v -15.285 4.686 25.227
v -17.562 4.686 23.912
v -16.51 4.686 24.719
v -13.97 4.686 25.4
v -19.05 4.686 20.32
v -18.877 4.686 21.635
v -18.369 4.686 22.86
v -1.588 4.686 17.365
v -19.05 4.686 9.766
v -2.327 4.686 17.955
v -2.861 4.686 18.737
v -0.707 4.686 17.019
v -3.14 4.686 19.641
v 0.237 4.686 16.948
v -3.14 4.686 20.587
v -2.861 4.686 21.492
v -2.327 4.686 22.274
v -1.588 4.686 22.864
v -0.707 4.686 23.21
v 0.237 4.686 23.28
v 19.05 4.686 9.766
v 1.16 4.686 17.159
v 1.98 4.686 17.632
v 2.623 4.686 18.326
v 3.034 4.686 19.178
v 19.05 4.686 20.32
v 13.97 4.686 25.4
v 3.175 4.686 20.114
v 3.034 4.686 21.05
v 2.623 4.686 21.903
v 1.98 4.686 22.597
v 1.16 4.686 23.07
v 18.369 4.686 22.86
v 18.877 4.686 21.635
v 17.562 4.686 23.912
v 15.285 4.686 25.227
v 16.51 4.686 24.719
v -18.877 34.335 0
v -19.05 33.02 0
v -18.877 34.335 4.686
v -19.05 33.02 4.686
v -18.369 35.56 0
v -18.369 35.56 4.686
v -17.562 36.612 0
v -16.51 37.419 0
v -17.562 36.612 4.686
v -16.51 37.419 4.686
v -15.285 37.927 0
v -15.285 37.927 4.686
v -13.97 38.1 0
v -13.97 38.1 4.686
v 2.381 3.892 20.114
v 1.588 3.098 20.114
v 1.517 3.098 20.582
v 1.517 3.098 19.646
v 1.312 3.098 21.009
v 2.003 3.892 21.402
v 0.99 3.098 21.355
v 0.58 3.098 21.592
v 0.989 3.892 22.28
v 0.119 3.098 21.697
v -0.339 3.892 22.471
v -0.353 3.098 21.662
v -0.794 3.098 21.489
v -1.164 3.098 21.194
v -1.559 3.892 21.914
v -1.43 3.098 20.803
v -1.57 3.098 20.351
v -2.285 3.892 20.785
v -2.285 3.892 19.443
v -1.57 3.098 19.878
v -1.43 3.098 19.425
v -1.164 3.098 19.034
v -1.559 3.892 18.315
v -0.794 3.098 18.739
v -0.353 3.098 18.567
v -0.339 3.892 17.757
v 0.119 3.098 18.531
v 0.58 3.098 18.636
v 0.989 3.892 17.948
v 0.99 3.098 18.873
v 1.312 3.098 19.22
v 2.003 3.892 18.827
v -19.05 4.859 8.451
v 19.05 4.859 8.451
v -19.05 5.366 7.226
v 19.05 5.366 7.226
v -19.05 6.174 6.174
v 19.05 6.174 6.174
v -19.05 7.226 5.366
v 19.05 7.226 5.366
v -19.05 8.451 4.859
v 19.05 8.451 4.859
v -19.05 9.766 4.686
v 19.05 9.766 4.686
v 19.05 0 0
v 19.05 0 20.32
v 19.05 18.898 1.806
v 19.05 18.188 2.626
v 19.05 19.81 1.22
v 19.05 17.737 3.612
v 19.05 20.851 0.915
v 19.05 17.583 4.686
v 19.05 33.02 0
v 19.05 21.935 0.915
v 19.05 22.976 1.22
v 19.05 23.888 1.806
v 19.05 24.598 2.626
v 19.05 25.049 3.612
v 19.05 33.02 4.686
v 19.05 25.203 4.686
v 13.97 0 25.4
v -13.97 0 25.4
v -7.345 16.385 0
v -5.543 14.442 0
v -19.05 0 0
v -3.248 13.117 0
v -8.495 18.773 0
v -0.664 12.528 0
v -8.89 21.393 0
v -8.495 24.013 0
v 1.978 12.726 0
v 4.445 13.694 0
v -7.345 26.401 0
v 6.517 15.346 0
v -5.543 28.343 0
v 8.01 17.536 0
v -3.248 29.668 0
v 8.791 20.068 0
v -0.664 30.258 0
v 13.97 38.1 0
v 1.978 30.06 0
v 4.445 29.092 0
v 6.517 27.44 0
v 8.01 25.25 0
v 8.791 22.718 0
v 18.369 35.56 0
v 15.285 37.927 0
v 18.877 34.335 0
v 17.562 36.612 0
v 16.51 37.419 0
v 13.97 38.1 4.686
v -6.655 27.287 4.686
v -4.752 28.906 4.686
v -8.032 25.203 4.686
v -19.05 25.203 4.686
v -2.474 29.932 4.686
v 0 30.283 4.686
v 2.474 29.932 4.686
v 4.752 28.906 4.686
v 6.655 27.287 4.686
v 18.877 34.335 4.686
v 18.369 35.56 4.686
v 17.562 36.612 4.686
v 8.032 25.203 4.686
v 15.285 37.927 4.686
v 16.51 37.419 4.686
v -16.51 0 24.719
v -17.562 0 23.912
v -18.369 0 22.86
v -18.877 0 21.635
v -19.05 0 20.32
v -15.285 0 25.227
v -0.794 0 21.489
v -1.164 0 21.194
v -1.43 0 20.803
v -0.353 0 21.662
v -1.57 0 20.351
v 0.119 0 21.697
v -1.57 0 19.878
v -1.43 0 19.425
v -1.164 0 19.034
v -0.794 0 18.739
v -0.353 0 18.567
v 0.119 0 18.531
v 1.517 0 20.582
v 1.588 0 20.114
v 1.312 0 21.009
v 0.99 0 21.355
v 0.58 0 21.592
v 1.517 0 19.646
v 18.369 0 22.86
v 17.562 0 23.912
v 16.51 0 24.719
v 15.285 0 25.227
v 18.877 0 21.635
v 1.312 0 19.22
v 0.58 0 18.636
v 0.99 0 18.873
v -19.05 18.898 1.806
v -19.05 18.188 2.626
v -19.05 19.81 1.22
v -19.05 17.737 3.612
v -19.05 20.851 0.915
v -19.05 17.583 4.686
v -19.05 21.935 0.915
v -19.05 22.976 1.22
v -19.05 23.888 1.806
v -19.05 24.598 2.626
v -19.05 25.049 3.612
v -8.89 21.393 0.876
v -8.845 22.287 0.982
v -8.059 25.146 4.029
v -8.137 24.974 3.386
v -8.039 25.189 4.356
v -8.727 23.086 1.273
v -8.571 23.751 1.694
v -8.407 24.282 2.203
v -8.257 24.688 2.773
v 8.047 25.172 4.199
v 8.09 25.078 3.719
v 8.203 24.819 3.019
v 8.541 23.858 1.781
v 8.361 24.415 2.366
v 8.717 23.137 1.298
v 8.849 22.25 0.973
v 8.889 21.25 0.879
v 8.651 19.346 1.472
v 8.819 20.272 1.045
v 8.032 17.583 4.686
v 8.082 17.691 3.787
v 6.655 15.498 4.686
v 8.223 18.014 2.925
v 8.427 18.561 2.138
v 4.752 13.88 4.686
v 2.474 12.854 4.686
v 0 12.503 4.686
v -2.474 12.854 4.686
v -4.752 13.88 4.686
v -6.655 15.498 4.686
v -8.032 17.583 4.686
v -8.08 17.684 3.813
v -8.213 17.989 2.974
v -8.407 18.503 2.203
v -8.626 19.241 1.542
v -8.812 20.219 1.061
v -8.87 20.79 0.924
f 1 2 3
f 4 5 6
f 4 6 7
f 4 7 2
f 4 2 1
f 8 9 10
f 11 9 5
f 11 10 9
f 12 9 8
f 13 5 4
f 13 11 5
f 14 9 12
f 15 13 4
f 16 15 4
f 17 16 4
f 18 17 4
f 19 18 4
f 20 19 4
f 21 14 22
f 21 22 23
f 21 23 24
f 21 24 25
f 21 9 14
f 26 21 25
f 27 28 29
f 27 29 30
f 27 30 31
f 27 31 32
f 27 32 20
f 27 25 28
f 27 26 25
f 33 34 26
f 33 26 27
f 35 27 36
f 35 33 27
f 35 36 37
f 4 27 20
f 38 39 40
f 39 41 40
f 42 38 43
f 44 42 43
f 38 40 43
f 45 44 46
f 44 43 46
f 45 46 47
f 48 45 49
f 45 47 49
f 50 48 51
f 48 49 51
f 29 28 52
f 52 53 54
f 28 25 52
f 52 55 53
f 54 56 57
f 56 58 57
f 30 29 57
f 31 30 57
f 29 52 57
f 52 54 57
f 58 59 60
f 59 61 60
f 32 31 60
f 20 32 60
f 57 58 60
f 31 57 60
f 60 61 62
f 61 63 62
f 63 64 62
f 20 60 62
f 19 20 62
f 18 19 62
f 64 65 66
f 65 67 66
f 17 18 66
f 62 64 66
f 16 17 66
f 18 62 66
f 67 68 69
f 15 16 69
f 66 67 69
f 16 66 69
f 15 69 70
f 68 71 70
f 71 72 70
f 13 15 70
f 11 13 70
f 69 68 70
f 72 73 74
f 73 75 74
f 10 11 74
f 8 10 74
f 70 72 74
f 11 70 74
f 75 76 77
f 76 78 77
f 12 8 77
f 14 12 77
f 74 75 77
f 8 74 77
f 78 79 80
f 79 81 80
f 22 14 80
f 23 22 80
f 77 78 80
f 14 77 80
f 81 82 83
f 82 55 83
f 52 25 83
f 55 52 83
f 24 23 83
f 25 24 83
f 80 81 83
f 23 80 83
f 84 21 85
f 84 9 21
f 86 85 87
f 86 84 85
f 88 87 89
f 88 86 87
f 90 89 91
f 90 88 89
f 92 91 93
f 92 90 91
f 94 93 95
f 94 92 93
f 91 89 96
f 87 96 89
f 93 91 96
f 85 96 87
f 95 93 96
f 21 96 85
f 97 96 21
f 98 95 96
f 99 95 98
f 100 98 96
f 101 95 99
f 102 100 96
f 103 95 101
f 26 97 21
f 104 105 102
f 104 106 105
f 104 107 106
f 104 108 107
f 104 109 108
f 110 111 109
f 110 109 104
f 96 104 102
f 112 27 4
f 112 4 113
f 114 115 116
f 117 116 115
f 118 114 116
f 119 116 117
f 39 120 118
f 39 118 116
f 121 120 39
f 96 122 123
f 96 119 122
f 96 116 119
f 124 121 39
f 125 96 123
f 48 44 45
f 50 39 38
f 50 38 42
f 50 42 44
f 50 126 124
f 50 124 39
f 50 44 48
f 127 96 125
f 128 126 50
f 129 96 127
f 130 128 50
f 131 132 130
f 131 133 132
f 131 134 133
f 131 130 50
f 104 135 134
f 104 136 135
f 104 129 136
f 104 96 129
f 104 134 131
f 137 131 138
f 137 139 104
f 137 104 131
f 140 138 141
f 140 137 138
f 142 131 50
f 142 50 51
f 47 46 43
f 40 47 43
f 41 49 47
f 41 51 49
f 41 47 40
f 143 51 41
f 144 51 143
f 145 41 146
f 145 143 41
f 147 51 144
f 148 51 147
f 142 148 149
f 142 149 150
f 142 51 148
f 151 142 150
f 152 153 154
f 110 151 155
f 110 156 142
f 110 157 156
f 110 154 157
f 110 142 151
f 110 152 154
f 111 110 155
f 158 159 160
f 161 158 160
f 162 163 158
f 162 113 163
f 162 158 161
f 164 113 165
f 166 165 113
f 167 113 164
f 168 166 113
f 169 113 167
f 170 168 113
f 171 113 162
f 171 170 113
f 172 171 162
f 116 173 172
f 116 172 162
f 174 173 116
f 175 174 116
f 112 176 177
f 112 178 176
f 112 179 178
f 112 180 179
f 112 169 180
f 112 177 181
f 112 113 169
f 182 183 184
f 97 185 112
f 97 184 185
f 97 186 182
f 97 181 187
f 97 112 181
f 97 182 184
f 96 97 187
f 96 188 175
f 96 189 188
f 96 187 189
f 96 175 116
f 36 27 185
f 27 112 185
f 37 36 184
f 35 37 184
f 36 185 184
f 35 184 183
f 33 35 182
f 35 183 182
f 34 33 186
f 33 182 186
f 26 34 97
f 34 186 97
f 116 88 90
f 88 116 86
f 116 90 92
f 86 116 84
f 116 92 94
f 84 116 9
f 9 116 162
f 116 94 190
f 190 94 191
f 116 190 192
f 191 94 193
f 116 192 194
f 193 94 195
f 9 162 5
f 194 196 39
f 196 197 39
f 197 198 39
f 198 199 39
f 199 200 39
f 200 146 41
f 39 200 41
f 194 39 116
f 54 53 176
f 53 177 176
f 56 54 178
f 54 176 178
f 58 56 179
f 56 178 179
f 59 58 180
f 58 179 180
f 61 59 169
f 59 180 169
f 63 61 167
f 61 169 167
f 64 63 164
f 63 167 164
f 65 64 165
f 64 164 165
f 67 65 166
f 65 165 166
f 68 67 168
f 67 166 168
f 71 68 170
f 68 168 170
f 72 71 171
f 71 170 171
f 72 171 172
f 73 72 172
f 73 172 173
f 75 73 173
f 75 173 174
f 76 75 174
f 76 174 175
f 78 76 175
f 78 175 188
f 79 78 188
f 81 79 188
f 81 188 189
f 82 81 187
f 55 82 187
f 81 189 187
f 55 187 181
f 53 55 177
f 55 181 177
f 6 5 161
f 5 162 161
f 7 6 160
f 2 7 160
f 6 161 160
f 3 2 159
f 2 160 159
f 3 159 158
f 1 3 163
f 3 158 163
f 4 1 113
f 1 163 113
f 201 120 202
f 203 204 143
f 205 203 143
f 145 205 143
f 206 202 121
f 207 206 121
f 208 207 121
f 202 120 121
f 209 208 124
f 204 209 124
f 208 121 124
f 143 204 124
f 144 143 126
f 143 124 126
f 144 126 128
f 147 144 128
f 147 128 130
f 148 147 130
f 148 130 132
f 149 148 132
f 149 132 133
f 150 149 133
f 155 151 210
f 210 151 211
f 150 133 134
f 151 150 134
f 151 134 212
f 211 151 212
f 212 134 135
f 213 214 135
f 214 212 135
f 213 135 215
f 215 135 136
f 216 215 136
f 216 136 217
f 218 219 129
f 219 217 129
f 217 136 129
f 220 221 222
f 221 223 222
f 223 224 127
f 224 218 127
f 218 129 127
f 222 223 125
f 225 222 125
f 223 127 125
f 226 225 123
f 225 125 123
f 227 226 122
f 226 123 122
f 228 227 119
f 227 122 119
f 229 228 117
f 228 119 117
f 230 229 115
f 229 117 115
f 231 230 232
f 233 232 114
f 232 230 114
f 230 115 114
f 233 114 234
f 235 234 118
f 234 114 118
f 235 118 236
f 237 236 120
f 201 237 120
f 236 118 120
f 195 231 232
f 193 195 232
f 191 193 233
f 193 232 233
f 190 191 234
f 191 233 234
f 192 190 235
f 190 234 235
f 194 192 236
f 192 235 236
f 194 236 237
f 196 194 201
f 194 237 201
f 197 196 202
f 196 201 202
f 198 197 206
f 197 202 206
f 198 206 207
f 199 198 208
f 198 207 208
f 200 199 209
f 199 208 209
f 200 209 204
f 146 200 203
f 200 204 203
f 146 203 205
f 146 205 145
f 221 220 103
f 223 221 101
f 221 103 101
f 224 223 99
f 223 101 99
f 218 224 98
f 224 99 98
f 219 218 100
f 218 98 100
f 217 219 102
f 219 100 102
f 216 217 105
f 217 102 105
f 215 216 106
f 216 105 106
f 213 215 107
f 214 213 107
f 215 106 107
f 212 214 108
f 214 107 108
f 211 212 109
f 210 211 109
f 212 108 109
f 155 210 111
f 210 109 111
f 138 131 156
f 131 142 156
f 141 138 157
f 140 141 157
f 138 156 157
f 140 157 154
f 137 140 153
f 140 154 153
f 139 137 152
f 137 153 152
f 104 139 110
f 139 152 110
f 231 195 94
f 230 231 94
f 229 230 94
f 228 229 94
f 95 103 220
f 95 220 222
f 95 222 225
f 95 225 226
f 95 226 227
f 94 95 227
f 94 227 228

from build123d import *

# Parameters (mm, degrees)
F1_DEPTH       = 19.05
F3_D           = 3.175
F3_CSINK_D     = 6.35
F3_CSINK_ANGLE = 90
F5_D           = 17.78
F7_DEPTH       = 38.101
F8_R           = 5.08
F9_R           = 5.08


with BuildPart() as f1:
    # F0 (on Right) → F1 (new body, symmetric)
    with BuildSketch(Plane.YZ):
        Polygon((4.68586, 25.4), (0, 25.4), (0, 0), (38.1, 0), (38.1, 4.68586), (4.68586, 4.68586), align=None)
    extrude(amount=F1_DEPTH, both=True)

    # F3 (through all)
    with Locations(Plane(origin=(0, 4.68586, 0), x_dir=(-1, 0, 0), z_dir=(0, 1, 0))):
        with Locations((0, 20.114239)):
            CounterSinkHole(F3_D / 2, F3_CSINK_D / 2, counter_sink_angle=F3_CSINK_ANGLE)

    # F5 (through all)
    with Locations(Plane.XY.offset(4.68586)):
        with Locations((0, 21.39293)):
            Hole(F5_D / 2)

    # F6 (on face) → F7 (cut, through all)
    with BuildSketch(Plane.YZ.offset(19.05)):
        with BuildLine():
            Line((25.20293, 4.68586), (17.58293, 4.68586))
            ThreePointArc((17.58293, 4.68586), (21.39293, 0.87586), (25.20293, 4.68586))
        make_face()
    extrude(amount=-F7_DEPTH, mode=Mode.SUBTRACT)

    # F8
    f8_edges = [f1.edges().sort_by_distance(p)[0] for p in [
        (0, 4.68586, 4.68586),
    ]]
    fillet(f8_edges, radius=F8_R)

    # F9
    f9_edges = [f1.edges().sort_by_distance(p)[0] for p in [
        (19.05, 38.1, 2.34293),
        (-19.05, 38.1, 2.34293),
        (19.05, 2.34293, 25.4),
        (-19.05, 2.34293, 25.4),
    ]]
    fillet(f9_edges, radius=F9_R)


solid = f1.part
